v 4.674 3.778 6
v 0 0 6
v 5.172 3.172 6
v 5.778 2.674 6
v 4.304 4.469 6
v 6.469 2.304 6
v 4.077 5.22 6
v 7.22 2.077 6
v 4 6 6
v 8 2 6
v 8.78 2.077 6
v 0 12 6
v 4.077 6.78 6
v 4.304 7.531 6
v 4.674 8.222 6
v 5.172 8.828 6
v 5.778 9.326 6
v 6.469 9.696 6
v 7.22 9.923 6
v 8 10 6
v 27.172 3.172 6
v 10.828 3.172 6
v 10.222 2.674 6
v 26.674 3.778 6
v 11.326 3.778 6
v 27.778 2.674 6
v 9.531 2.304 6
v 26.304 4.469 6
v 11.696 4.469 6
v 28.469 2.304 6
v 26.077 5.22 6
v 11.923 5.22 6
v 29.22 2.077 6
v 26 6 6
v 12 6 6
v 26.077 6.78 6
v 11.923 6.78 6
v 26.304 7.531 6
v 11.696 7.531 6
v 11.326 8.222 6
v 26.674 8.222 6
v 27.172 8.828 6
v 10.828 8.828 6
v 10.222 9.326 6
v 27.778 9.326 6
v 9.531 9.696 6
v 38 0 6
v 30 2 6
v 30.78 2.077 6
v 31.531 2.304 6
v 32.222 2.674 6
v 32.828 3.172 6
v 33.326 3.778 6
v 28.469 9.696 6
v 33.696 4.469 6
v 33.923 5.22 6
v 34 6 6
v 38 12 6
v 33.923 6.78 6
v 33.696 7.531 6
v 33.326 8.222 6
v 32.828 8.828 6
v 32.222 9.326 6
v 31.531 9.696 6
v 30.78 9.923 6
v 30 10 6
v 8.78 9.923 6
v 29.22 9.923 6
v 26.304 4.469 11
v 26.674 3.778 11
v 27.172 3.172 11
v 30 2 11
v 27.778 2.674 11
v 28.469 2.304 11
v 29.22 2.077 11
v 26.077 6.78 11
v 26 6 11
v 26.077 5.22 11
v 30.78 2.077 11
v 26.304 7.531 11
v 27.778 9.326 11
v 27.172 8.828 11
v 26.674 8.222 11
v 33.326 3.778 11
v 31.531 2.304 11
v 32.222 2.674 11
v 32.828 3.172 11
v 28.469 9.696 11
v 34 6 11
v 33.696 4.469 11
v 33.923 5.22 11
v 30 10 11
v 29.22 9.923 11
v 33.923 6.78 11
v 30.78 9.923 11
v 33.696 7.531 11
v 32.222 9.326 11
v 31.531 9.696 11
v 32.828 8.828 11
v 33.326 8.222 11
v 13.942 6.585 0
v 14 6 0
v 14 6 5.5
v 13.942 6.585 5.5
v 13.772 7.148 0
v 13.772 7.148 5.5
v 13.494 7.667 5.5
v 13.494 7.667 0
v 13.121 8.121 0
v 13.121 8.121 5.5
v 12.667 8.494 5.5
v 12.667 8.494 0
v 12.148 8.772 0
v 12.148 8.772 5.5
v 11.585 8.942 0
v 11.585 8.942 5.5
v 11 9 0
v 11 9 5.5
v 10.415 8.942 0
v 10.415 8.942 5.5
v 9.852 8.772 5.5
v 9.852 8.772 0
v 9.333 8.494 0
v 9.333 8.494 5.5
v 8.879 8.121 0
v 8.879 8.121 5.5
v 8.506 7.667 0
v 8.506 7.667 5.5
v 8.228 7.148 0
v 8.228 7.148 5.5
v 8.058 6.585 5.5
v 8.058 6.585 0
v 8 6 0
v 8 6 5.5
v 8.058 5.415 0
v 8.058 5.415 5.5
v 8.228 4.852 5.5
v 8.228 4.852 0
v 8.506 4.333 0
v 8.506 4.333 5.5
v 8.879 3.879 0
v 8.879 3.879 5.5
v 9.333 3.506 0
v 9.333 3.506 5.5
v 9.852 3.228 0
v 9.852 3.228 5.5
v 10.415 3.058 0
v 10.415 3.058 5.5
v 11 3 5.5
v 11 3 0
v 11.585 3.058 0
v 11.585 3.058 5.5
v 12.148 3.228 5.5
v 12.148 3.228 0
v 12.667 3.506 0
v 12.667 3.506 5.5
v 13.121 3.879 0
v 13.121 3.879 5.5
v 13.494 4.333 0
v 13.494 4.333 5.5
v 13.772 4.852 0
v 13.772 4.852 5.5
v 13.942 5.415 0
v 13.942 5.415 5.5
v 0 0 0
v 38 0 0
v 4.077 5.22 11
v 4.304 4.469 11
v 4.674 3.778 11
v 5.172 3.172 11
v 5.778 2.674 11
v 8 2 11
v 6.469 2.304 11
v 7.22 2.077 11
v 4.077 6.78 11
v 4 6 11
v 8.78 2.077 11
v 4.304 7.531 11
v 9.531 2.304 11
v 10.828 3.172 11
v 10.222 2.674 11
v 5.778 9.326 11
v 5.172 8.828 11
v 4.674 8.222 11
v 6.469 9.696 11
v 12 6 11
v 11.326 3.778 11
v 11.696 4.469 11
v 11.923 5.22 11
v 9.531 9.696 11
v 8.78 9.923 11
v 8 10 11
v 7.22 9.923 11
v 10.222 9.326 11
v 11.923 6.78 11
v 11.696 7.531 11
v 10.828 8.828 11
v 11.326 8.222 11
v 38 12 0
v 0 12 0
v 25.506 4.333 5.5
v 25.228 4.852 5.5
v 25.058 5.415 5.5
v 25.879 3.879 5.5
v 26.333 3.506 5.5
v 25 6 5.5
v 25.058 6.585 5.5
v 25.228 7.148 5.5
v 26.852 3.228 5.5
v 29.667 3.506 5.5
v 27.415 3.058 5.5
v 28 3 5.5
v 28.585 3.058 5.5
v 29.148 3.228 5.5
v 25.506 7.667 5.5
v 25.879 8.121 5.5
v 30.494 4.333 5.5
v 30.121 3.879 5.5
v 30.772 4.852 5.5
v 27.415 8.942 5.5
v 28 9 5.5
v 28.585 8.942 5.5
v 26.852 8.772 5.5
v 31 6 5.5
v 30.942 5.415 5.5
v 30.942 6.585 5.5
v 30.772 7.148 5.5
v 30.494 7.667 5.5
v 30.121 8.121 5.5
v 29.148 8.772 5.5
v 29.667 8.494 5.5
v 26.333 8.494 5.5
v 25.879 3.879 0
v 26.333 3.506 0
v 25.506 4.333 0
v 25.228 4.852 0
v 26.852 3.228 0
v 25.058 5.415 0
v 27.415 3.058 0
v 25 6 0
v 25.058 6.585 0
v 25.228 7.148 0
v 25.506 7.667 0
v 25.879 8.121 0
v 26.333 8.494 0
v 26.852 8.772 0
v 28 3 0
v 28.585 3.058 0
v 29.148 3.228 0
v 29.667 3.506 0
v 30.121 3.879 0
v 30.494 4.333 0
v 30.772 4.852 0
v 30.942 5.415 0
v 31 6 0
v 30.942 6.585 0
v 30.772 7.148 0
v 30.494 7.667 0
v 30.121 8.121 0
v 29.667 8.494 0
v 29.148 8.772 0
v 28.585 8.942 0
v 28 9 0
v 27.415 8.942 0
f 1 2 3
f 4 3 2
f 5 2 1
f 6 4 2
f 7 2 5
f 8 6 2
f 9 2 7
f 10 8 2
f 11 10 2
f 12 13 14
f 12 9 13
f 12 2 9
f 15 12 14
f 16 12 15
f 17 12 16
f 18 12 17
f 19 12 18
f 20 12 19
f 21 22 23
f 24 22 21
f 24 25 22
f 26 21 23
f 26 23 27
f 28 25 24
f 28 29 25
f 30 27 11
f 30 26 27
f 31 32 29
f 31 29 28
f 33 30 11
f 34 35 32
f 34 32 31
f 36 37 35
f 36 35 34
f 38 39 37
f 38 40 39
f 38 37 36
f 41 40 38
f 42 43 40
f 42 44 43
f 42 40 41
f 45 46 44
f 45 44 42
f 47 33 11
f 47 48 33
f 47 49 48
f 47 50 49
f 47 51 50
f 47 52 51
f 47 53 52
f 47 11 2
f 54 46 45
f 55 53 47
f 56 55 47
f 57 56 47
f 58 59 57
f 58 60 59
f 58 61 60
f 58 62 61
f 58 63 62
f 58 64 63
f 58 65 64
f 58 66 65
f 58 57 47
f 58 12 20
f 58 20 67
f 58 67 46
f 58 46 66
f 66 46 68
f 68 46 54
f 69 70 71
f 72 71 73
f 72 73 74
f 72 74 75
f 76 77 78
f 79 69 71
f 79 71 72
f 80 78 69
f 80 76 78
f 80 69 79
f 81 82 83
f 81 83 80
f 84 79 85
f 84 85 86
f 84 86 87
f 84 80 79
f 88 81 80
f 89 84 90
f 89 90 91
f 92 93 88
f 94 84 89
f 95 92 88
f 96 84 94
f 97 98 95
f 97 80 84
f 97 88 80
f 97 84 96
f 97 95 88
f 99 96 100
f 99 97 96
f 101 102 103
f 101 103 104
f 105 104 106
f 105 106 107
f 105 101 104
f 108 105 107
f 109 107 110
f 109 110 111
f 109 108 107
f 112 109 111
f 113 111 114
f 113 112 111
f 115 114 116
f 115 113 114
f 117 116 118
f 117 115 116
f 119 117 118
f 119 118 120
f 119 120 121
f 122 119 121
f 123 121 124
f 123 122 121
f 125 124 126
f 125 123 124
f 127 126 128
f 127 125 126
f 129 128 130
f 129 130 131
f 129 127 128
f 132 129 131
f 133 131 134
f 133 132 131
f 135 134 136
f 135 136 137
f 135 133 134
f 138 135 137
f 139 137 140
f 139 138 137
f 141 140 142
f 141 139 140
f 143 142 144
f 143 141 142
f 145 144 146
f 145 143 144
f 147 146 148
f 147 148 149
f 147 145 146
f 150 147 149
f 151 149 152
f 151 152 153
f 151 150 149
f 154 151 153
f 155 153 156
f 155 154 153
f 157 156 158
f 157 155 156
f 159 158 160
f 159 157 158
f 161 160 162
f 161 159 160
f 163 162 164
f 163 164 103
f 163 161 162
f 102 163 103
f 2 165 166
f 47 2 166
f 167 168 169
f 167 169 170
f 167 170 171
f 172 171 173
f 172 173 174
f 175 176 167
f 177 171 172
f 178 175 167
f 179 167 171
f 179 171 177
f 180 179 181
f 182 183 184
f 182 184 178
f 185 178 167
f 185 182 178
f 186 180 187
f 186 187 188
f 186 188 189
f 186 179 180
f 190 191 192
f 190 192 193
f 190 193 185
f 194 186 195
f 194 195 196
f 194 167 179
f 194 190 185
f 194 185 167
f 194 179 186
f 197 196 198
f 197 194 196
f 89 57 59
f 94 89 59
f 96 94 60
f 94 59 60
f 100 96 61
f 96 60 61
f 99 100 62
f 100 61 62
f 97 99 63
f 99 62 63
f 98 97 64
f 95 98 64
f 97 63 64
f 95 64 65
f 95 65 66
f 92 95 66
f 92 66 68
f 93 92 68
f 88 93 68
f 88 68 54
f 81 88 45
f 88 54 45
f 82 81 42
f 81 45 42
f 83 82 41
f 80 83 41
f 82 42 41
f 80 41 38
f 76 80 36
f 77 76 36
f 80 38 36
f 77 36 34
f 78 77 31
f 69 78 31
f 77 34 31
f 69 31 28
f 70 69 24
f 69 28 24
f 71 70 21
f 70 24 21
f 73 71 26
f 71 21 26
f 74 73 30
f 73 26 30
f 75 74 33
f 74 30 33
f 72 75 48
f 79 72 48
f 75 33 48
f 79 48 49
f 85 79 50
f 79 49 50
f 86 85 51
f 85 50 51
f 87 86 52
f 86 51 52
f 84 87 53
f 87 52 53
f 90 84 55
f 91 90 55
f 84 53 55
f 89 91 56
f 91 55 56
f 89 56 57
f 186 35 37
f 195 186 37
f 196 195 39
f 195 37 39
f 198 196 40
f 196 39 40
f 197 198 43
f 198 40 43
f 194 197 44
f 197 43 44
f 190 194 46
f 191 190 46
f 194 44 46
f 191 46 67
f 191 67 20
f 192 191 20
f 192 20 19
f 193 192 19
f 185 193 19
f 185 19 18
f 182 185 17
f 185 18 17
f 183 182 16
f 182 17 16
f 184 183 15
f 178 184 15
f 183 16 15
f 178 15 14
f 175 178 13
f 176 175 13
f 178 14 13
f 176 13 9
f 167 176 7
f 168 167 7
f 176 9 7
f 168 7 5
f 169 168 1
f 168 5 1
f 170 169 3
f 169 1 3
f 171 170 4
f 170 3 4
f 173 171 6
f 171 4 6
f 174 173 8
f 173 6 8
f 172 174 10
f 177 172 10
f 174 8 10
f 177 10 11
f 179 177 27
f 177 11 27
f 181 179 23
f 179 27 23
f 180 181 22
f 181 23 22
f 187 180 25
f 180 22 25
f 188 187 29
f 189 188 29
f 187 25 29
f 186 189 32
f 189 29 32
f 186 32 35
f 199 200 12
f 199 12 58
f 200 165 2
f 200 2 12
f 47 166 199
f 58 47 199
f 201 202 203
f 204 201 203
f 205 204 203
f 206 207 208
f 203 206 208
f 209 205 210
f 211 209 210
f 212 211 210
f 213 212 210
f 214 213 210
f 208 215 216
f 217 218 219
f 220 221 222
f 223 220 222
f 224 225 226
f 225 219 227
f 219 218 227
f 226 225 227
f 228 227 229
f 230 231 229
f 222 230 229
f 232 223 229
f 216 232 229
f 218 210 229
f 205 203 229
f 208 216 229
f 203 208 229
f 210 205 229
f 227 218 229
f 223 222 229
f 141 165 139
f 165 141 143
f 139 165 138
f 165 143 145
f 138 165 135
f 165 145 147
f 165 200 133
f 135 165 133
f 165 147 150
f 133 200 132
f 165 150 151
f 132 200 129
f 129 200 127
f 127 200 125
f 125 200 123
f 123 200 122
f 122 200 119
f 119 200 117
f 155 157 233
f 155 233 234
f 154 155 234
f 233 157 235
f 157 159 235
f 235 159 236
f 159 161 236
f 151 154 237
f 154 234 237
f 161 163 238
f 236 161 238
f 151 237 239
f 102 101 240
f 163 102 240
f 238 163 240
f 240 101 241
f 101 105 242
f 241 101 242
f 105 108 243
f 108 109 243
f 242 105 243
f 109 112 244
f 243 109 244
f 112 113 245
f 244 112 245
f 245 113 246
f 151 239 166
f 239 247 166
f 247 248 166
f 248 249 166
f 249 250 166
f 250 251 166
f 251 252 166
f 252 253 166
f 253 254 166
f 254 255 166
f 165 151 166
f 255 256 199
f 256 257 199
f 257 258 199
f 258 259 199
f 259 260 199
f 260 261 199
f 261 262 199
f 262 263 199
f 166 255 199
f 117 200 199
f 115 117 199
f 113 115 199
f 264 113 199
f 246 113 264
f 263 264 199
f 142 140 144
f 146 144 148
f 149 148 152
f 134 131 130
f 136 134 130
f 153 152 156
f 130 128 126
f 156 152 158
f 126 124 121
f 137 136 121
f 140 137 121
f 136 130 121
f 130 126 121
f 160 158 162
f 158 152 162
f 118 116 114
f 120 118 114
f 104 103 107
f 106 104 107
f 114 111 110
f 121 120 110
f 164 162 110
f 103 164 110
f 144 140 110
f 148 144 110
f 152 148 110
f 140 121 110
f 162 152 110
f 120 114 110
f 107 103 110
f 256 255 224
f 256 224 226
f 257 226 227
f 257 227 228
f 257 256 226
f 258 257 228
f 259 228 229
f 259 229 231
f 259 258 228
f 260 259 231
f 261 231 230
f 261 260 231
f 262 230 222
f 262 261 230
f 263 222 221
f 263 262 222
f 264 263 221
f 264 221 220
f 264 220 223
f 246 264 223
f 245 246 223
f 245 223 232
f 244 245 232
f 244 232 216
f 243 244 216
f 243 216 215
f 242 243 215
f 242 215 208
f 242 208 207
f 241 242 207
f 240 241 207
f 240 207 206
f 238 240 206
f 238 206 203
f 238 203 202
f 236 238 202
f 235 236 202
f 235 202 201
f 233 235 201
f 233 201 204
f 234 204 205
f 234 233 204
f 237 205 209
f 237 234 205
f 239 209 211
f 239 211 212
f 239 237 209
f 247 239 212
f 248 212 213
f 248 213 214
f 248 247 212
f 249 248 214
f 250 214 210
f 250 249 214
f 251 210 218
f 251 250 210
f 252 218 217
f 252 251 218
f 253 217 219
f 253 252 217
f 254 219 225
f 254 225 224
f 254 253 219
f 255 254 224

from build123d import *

# Parameters (mm, degrees)
F0_W     = 38
F0_H     = 12
F1_DEPTH = 6
F2_R     = 4
F3_DEPTH = 5
F4_R     = 4
F5_DEPTH = 5
F6_R     = 3
F7_DEPTH = 5
F8_DEPTH = 5.5


with BuildPart() as f1:
    # F0 (on Top) → F1 (new body)
    with BuildSketch(Plane.XY):
        with Locations((19, 6)):
            Rectangle(F0_W, F0_H)
    extrude(amount=F1_DEPTH)

    # F2 (on face) → F3 (join)
    with BuildSketch(Plane.XY.offset(6)):
        with Locations((8, 6)):
            Circle(F2_R)
    extrude(amount=F3_DEPTH)

    # F4 (on face) → F5 (join)
    with BuildSketch(Plane.XY.offset(6)):
        with Locations((30, 6)):
            Circle(F4_R)
    extrude(amount=F5_DEPTH)

    # F6 (on face) → F7 (cut)
    with BuildSketch(Plane.XY):
        with Locations((28, 6)):
            Circle(F6_R)
    extrude(amount=F7_DEPTH, mode=Mode.SUBTRACT)

    # F6 (on face) → F8 (cut)
    with BuildSketch(Plane.XY):
        with Locations((28, 6)):
            Circle(F6_R)
        with Locations((11, 6)):
            Circle(F6_R)
    extrude(amount=F8_DEPTH, mode=Mode.SUBTRACT)


solid = f1.part
